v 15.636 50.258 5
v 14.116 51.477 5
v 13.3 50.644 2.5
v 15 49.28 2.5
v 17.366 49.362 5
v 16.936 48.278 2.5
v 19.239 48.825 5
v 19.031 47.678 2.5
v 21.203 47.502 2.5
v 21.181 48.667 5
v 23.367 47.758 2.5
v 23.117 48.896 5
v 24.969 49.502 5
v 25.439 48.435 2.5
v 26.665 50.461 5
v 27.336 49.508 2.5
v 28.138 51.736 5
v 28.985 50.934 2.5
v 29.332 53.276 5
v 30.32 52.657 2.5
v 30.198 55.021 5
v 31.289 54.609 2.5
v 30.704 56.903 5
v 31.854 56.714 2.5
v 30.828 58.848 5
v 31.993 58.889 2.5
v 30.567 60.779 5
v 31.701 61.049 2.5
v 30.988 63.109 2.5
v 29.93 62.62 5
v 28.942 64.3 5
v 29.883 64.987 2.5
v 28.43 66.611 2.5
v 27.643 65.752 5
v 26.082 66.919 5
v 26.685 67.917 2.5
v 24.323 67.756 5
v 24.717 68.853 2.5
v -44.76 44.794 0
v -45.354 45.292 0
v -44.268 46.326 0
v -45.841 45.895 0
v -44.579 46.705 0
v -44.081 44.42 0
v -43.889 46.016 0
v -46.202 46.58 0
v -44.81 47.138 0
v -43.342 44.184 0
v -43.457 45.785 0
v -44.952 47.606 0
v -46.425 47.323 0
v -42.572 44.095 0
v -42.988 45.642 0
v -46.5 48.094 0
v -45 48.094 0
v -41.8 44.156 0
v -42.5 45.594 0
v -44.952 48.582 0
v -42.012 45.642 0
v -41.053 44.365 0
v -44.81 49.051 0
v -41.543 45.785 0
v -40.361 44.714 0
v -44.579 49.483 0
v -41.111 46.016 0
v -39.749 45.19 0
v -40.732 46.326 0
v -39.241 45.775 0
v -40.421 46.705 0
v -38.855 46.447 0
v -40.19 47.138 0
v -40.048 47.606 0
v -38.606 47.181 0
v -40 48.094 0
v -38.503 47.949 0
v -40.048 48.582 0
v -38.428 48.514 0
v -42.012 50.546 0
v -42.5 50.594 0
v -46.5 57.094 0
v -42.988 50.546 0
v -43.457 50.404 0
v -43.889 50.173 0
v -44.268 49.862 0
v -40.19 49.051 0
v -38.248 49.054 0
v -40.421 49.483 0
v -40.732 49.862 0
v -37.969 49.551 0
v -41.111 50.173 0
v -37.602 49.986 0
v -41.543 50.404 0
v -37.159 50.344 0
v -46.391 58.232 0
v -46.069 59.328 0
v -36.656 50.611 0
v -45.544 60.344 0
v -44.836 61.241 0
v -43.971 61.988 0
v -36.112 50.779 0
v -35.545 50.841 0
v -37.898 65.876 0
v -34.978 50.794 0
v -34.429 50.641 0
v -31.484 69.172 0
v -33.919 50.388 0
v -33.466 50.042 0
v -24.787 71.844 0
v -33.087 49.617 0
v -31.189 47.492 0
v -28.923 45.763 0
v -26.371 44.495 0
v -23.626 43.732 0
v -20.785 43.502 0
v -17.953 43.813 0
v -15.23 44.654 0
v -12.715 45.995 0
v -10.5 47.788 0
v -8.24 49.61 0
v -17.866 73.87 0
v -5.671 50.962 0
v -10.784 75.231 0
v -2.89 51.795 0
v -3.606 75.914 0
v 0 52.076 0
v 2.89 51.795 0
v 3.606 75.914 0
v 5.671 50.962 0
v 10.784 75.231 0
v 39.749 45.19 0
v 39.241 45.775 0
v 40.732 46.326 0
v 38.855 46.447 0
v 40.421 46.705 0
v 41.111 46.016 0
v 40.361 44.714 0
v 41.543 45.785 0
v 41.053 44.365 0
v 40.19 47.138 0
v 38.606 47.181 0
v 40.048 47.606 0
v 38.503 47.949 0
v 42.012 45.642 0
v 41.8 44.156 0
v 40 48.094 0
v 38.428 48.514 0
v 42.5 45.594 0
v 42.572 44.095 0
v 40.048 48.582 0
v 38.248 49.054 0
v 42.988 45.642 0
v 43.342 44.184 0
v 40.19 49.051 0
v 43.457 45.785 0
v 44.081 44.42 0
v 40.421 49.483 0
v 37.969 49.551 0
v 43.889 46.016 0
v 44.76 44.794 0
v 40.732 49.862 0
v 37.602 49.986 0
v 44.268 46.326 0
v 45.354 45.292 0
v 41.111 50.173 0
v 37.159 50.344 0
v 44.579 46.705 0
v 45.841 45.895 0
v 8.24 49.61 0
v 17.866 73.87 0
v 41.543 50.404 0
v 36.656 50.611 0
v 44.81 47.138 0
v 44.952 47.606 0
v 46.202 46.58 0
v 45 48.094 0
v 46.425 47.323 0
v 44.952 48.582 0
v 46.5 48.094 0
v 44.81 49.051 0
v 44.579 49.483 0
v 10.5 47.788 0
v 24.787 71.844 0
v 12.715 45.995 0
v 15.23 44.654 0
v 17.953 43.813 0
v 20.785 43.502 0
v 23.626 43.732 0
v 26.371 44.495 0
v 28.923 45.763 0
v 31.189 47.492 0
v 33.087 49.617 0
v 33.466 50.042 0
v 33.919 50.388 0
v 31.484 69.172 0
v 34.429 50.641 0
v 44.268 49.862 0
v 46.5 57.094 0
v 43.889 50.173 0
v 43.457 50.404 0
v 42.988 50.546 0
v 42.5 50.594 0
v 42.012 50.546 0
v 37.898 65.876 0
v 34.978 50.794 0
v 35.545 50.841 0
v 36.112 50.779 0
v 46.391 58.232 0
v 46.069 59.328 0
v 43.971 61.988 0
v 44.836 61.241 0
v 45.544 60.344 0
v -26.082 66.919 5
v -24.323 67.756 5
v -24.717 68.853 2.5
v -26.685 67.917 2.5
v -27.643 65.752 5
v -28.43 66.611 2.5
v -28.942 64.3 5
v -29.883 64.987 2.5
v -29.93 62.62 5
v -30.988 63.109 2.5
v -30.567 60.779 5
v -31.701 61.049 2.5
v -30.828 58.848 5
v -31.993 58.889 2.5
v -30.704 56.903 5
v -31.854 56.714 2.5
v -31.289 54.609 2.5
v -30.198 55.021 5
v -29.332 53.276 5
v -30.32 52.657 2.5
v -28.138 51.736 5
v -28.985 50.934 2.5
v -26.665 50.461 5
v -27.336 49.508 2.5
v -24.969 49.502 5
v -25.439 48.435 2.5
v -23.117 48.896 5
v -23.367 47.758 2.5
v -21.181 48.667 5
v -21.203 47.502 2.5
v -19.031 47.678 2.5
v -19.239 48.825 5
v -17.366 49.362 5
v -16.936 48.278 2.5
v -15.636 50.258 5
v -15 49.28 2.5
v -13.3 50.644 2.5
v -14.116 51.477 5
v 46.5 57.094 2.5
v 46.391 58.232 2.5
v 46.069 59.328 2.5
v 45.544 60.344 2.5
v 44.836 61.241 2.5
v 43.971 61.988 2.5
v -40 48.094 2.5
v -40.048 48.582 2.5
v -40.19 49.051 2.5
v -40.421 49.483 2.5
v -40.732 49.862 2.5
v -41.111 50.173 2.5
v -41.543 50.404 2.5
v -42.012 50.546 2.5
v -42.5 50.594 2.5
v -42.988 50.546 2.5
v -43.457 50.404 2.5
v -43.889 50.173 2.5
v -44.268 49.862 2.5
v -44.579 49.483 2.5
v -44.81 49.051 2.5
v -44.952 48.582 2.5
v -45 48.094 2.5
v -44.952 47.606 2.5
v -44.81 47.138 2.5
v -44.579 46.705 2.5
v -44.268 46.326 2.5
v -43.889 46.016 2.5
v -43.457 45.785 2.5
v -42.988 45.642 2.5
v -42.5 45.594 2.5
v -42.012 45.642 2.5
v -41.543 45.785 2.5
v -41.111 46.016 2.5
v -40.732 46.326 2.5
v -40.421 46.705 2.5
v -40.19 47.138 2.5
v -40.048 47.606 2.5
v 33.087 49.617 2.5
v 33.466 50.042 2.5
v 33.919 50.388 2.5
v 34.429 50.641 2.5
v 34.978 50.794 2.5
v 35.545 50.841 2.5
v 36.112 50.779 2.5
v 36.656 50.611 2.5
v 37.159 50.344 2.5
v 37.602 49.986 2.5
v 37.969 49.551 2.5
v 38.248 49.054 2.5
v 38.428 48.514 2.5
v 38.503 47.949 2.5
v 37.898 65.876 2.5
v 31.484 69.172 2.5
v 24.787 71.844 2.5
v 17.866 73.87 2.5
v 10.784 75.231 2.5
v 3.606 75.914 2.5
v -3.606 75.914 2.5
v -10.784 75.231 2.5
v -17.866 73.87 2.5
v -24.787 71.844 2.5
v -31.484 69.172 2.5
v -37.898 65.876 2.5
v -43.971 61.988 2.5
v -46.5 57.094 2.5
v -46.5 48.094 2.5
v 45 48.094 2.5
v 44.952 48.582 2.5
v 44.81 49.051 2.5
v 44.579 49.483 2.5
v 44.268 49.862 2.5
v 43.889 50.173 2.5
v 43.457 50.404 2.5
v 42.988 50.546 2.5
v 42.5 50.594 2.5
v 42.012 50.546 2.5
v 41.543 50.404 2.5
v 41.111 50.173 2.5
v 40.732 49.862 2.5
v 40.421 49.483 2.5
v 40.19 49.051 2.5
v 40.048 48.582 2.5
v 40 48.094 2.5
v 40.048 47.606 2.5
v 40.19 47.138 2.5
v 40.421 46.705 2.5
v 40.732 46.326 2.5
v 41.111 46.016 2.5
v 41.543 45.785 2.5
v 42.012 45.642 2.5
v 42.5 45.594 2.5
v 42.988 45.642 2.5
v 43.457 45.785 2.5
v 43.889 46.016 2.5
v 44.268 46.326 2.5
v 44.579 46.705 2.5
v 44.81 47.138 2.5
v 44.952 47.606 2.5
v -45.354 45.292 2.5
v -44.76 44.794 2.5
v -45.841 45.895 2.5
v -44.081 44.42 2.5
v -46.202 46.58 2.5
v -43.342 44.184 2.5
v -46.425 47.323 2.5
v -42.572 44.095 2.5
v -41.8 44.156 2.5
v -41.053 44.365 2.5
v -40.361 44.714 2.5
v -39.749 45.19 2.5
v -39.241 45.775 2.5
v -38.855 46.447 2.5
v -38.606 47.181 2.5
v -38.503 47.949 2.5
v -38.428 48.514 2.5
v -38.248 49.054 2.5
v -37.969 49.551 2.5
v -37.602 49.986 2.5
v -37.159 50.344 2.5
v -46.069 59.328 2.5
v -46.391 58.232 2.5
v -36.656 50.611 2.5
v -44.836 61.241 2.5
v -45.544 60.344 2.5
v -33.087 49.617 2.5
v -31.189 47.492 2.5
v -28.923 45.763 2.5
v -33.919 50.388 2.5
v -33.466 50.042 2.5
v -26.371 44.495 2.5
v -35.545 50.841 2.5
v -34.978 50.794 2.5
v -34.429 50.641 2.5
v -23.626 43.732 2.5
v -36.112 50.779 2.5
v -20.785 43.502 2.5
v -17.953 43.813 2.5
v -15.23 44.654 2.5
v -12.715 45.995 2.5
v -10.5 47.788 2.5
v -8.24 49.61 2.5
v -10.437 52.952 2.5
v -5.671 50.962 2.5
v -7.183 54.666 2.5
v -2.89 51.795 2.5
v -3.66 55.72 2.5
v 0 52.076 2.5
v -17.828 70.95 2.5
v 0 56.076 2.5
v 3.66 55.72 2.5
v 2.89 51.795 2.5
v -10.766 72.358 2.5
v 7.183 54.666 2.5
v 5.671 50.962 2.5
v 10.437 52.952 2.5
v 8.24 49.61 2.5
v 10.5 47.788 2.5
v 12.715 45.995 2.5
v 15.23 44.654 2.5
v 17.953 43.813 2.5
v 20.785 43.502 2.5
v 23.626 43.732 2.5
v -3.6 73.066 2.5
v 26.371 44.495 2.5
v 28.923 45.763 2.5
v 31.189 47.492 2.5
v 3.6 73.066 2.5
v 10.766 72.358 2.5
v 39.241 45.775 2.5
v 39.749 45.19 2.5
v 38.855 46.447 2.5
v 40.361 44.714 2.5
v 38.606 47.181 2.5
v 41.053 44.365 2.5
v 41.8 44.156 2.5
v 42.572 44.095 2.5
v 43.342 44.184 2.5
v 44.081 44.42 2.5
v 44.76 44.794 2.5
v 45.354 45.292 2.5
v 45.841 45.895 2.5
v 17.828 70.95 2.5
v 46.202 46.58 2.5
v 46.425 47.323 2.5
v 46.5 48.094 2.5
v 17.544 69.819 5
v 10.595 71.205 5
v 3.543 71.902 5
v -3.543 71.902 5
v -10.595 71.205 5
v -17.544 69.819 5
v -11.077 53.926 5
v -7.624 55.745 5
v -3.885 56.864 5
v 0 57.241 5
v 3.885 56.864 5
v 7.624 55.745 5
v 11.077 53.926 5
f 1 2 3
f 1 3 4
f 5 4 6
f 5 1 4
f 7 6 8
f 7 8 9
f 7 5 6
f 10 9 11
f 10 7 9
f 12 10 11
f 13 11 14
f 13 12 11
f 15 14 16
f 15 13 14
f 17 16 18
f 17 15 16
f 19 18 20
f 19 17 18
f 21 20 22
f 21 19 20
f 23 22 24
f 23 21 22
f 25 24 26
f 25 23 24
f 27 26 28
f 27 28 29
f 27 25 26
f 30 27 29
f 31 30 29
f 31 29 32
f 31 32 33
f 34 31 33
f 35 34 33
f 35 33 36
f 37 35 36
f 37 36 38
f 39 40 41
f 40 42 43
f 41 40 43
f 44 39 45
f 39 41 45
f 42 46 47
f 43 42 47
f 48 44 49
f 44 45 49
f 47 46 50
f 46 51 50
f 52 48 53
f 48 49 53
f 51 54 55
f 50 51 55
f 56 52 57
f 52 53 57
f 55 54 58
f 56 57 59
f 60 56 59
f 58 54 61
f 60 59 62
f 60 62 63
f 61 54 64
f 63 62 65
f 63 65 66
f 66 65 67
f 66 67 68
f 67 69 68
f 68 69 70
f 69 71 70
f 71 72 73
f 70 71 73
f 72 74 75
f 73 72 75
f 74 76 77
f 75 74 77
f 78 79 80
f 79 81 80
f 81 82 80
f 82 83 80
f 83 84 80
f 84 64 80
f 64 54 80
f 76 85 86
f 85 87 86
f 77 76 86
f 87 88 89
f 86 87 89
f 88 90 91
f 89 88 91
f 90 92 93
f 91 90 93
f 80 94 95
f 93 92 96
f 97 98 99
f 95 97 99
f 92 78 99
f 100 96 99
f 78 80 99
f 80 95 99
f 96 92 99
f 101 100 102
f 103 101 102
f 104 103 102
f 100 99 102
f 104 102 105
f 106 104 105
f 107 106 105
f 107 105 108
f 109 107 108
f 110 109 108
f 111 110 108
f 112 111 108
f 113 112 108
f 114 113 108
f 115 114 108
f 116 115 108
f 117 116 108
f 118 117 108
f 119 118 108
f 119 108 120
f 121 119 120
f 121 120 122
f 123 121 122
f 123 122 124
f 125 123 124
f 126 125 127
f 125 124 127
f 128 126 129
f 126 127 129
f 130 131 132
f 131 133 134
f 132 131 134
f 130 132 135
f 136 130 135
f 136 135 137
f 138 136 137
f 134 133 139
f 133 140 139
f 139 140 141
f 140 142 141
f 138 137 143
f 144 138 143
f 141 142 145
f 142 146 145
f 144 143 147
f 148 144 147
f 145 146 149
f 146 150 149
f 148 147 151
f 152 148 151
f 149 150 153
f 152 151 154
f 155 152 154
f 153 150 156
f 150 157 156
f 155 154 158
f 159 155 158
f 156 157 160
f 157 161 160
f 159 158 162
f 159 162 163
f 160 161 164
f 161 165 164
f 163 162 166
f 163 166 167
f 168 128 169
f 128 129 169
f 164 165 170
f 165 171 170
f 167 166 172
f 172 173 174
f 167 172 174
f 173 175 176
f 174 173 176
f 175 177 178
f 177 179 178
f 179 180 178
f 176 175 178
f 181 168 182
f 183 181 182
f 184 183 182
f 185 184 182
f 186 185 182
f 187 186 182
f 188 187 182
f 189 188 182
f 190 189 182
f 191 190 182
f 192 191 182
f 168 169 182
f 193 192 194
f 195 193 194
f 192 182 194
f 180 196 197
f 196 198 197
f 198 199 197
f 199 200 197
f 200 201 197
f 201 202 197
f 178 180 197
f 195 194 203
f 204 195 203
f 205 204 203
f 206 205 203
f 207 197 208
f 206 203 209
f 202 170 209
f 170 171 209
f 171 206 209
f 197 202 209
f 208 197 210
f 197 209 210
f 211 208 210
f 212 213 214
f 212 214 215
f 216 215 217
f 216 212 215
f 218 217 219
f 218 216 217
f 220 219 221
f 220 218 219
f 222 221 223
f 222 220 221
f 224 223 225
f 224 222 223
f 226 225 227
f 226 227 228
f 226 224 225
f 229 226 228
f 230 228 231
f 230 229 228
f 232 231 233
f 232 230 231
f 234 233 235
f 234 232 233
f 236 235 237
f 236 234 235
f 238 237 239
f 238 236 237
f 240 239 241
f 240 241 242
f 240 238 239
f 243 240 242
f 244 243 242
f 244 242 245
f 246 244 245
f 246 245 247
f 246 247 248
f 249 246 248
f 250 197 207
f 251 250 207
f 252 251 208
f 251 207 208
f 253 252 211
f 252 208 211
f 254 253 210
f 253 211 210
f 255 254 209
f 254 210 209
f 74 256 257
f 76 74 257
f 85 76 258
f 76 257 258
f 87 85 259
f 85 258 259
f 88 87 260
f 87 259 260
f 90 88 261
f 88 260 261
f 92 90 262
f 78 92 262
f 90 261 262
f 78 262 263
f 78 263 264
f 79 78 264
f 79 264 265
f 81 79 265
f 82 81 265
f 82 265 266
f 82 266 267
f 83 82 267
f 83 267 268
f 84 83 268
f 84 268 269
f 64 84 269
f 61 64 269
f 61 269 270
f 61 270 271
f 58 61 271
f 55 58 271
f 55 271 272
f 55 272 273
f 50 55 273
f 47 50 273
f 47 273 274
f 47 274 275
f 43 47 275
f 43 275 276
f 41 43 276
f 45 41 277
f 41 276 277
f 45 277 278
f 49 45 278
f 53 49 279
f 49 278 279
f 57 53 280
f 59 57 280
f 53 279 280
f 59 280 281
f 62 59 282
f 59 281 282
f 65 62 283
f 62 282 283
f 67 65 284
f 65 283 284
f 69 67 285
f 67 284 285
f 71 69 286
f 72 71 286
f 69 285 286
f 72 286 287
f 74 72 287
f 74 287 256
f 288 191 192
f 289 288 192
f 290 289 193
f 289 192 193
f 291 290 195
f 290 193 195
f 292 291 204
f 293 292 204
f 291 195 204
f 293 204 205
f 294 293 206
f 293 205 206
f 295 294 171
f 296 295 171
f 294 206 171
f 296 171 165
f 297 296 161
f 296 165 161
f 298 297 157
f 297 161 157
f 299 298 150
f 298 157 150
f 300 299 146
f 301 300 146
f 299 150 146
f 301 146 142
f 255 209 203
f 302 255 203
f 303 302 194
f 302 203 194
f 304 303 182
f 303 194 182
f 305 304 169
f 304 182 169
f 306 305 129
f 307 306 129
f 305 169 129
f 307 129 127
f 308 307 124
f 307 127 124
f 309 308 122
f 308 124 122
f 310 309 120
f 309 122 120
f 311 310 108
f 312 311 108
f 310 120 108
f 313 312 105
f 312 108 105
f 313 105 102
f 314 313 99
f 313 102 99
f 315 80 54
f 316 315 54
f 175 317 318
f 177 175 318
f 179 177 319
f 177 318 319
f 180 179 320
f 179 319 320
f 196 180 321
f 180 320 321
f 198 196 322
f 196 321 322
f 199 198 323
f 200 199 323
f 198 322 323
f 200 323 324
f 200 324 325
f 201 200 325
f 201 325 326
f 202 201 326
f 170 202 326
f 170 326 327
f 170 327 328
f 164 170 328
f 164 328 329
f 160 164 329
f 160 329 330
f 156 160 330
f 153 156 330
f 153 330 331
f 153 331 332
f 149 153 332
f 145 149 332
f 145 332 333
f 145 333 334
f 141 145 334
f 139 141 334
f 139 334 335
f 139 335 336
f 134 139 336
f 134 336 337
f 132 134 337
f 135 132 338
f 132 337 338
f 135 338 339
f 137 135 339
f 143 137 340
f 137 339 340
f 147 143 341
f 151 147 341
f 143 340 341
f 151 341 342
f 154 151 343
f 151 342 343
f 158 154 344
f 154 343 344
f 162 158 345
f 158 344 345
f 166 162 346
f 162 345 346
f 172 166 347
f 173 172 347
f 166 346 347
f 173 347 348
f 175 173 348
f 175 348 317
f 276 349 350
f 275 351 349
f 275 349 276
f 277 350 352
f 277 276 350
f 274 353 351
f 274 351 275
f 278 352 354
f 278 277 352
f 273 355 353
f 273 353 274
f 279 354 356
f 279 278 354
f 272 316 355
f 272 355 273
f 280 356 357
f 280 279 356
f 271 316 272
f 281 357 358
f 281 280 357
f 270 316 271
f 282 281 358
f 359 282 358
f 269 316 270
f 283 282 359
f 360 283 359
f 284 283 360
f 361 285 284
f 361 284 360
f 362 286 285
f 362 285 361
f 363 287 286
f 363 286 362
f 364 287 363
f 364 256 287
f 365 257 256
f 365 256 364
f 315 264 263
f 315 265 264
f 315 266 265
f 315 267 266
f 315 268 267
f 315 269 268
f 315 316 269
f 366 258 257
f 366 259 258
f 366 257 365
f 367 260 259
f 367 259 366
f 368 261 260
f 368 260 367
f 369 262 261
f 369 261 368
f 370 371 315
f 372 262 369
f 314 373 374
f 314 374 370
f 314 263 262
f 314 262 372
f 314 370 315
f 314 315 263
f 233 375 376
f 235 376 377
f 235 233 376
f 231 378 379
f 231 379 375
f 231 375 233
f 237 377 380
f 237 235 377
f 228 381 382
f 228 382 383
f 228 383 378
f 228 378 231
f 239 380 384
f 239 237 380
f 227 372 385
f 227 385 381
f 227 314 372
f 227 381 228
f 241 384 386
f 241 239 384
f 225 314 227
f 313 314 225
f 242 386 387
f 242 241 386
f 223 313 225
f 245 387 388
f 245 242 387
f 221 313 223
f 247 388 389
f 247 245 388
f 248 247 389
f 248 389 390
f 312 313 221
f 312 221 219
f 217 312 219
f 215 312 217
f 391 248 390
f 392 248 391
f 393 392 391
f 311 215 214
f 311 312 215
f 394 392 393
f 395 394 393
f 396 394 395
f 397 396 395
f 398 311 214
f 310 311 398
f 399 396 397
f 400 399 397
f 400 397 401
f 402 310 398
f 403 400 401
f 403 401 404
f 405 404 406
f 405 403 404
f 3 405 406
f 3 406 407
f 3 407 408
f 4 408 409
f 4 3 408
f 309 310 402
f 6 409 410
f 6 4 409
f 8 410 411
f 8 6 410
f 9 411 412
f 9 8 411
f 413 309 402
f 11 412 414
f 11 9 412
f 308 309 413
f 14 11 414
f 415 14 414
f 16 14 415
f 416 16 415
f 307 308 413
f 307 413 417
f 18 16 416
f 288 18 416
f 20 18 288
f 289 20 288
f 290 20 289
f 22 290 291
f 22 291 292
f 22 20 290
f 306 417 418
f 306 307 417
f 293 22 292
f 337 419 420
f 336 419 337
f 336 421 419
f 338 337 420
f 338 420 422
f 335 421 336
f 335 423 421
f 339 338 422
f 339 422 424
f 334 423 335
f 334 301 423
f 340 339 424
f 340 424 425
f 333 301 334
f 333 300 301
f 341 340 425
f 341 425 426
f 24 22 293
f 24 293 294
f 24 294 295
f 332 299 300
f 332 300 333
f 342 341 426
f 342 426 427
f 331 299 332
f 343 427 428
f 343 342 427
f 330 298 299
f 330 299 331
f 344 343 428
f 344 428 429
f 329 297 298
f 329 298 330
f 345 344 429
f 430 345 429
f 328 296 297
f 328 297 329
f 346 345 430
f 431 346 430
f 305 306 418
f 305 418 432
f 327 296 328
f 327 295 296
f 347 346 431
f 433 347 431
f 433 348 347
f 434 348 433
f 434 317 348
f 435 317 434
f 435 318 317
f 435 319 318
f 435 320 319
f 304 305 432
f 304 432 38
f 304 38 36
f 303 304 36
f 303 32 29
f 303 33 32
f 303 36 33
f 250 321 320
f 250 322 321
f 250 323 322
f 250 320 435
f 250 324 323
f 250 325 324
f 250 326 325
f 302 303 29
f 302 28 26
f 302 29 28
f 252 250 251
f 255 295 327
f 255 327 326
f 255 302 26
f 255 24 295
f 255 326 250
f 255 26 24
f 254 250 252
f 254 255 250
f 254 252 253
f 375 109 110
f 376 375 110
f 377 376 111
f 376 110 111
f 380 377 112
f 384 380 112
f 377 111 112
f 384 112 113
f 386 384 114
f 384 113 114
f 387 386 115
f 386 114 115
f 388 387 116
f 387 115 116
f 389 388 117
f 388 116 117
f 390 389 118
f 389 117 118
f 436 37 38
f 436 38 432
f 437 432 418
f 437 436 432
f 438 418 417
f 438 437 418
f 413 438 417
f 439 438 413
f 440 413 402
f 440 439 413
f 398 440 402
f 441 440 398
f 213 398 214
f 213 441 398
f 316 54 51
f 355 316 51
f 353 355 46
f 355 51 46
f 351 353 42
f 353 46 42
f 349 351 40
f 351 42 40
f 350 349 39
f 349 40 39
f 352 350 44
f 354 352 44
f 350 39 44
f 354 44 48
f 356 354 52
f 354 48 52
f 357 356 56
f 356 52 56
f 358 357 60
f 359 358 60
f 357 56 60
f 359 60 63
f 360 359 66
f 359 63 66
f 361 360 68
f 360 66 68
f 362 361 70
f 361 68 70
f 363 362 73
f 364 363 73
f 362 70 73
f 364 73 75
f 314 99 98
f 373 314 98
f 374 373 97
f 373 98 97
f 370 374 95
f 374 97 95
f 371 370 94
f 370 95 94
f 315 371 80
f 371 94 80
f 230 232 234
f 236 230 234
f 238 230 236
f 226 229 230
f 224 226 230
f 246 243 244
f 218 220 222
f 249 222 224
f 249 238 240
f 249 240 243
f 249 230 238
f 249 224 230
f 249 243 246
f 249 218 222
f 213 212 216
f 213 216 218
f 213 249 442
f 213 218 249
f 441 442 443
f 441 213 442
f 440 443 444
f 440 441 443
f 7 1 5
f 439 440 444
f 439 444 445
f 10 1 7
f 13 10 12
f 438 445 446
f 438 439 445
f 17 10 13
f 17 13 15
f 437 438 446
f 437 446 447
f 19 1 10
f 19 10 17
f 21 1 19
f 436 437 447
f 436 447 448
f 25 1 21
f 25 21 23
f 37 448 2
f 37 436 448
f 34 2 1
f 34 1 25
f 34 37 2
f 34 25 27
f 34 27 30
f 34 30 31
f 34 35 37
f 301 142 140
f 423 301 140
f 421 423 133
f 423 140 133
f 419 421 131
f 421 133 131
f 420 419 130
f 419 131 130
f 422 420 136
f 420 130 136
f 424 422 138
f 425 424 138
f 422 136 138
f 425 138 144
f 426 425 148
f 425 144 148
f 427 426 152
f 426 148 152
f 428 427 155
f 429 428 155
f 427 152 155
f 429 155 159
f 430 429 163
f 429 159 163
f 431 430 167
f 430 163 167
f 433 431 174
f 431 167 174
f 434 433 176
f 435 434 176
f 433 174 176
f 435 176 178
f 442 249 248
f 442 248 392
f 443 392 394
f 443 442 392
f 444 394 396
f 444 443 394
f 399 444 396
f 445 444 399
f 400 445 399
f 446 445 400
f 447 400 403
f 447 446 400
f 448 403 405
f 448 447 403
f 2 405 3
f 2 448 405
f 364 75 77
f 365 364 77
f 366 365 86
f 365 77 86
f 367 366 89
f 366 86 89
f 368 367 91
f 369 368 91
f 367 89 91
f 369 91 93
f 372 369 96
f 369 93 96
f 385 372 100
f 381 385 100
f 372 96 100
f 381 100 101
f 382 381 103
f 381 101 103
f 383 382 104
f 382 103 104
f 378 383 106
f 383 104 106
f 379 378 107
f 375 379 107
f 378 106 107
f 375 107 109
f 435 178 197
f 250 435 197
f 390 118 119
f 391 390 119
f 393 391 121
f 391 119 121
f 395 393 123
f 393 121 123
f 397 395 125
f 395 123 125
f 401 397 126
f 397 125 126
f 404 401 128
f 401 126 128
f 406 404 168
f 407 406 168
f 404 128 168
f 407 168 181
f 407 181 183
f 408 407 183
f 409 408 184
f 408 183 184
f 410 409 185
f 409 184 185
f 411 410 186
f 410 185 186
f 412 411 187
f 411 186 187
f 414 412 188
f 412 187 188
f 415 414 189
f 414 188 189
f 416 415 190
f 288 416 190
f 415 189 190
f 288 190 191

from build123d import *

# Parameters (mm, degrees)
BOSS_EXTRUDE1_DEPTH = 2.5
BOSS_EXTRUDE2_DEPTH = 2.5
BOSS_EXTRUDE2_TAPER = 25
SKETCH4_R           = 2.5
CUT_EXTRUDE1_DEPTH  = 90.131924696


with BuildPart() as part:
    # Sketch1 → Boss-Extrude1 (new body)
    with BuildSketch(Plane.XY):
        with BuildLine():
            Line((-46.5, 57.094220373), (-46.5, 48.094220373))
            ThreePointArc((-46.5, 48.094220373), (-42.572396728, 44.094875587), (-38.502620643, 47.949450635))
            ThreePointArc((-38.502620643, 47.949450635), (-36.387640055, 50.707965196), (-33.087155105, 49.617394443))
            ThreePointArc((-33.087155105, 49.617394443), (-22.211018918, 43.548965481), (-10.5, 47.787857357))
            ThreePointArc((-10.5, 47.787857357), (0, 52.075714714), (10.5, 47.787857357))
            ThreePointArc((10.5, 47.787857357), (22.211018918, 43.548965481), (33.087155105, 49.617394443))
            ThreePointArc((33.087155105, 49.617394443), (36.387640055, 50.707965196), (38.502620643, 47.949450635))
            ThreePointArc((38.502620643, 47.949450635), (42.572396728, 44.094875587), (46.5, 48.094220373))
            Line((46.5, 48.094220373), (46.5, 57.094220373))
            ThreePointArc((46.5, 57.094220373), (45.830505203, 59.848437918), (43.971428571, 61.988010691))
            ThreePointArc((43.971428571, 61.988010691), (0, 76), (-43.971428571, 61.988010691))
            ThreePointArc((-43.971428571, 61.988010691), (-45.830505203, 59.848437918), (-46.5, 57.094220373))
        make_face()
    extrude(amount=BOSS_EXTRUDE1_DEPTH)

    # Sketch3 → Boss-Extrude2 (add)
    with BuildSketch(Plane.XY.offset(2.5)):
        with BuildLine():
            ThreePointArc((24.71651229, 68.853141378), (0, 73.155048065), (-24.71651229, 68.853141378))
            ThreePointArc((-24.71651229, 68.853141378), (-30.319675299, 52.656743004), (-13.3, 50.644428729))
            ThreePointArc((-13.3, 50.644428729), (0, 56.075714714), (13.3, 50.644428729))
            ThreePointArc((13.3, 50.644428729), (30.319675299, 52.656743004), (24.71651229, 68.853141378))
        make_face()
    extrude(amount=BOSS_EXTRUDE2_DEPTH, taper=BOSS_EXTRUDE2_TAPER)

    # Sketch4 → Cut-Extrude1 (cut, through all)
    with BuildSketch(Plane.XY.offset(2.5)):
        with Locations((-42.5, 48.094220373)):
            Circle(SKETCH4_R)
        with Locations((42.5, 48.094220373)):
            Circle(SKETCH4_R)
    extrude(amount=-CUT_EXTRUDE1_DEPTH, mode=Mode.SUBTRACT)


solid = part.part
